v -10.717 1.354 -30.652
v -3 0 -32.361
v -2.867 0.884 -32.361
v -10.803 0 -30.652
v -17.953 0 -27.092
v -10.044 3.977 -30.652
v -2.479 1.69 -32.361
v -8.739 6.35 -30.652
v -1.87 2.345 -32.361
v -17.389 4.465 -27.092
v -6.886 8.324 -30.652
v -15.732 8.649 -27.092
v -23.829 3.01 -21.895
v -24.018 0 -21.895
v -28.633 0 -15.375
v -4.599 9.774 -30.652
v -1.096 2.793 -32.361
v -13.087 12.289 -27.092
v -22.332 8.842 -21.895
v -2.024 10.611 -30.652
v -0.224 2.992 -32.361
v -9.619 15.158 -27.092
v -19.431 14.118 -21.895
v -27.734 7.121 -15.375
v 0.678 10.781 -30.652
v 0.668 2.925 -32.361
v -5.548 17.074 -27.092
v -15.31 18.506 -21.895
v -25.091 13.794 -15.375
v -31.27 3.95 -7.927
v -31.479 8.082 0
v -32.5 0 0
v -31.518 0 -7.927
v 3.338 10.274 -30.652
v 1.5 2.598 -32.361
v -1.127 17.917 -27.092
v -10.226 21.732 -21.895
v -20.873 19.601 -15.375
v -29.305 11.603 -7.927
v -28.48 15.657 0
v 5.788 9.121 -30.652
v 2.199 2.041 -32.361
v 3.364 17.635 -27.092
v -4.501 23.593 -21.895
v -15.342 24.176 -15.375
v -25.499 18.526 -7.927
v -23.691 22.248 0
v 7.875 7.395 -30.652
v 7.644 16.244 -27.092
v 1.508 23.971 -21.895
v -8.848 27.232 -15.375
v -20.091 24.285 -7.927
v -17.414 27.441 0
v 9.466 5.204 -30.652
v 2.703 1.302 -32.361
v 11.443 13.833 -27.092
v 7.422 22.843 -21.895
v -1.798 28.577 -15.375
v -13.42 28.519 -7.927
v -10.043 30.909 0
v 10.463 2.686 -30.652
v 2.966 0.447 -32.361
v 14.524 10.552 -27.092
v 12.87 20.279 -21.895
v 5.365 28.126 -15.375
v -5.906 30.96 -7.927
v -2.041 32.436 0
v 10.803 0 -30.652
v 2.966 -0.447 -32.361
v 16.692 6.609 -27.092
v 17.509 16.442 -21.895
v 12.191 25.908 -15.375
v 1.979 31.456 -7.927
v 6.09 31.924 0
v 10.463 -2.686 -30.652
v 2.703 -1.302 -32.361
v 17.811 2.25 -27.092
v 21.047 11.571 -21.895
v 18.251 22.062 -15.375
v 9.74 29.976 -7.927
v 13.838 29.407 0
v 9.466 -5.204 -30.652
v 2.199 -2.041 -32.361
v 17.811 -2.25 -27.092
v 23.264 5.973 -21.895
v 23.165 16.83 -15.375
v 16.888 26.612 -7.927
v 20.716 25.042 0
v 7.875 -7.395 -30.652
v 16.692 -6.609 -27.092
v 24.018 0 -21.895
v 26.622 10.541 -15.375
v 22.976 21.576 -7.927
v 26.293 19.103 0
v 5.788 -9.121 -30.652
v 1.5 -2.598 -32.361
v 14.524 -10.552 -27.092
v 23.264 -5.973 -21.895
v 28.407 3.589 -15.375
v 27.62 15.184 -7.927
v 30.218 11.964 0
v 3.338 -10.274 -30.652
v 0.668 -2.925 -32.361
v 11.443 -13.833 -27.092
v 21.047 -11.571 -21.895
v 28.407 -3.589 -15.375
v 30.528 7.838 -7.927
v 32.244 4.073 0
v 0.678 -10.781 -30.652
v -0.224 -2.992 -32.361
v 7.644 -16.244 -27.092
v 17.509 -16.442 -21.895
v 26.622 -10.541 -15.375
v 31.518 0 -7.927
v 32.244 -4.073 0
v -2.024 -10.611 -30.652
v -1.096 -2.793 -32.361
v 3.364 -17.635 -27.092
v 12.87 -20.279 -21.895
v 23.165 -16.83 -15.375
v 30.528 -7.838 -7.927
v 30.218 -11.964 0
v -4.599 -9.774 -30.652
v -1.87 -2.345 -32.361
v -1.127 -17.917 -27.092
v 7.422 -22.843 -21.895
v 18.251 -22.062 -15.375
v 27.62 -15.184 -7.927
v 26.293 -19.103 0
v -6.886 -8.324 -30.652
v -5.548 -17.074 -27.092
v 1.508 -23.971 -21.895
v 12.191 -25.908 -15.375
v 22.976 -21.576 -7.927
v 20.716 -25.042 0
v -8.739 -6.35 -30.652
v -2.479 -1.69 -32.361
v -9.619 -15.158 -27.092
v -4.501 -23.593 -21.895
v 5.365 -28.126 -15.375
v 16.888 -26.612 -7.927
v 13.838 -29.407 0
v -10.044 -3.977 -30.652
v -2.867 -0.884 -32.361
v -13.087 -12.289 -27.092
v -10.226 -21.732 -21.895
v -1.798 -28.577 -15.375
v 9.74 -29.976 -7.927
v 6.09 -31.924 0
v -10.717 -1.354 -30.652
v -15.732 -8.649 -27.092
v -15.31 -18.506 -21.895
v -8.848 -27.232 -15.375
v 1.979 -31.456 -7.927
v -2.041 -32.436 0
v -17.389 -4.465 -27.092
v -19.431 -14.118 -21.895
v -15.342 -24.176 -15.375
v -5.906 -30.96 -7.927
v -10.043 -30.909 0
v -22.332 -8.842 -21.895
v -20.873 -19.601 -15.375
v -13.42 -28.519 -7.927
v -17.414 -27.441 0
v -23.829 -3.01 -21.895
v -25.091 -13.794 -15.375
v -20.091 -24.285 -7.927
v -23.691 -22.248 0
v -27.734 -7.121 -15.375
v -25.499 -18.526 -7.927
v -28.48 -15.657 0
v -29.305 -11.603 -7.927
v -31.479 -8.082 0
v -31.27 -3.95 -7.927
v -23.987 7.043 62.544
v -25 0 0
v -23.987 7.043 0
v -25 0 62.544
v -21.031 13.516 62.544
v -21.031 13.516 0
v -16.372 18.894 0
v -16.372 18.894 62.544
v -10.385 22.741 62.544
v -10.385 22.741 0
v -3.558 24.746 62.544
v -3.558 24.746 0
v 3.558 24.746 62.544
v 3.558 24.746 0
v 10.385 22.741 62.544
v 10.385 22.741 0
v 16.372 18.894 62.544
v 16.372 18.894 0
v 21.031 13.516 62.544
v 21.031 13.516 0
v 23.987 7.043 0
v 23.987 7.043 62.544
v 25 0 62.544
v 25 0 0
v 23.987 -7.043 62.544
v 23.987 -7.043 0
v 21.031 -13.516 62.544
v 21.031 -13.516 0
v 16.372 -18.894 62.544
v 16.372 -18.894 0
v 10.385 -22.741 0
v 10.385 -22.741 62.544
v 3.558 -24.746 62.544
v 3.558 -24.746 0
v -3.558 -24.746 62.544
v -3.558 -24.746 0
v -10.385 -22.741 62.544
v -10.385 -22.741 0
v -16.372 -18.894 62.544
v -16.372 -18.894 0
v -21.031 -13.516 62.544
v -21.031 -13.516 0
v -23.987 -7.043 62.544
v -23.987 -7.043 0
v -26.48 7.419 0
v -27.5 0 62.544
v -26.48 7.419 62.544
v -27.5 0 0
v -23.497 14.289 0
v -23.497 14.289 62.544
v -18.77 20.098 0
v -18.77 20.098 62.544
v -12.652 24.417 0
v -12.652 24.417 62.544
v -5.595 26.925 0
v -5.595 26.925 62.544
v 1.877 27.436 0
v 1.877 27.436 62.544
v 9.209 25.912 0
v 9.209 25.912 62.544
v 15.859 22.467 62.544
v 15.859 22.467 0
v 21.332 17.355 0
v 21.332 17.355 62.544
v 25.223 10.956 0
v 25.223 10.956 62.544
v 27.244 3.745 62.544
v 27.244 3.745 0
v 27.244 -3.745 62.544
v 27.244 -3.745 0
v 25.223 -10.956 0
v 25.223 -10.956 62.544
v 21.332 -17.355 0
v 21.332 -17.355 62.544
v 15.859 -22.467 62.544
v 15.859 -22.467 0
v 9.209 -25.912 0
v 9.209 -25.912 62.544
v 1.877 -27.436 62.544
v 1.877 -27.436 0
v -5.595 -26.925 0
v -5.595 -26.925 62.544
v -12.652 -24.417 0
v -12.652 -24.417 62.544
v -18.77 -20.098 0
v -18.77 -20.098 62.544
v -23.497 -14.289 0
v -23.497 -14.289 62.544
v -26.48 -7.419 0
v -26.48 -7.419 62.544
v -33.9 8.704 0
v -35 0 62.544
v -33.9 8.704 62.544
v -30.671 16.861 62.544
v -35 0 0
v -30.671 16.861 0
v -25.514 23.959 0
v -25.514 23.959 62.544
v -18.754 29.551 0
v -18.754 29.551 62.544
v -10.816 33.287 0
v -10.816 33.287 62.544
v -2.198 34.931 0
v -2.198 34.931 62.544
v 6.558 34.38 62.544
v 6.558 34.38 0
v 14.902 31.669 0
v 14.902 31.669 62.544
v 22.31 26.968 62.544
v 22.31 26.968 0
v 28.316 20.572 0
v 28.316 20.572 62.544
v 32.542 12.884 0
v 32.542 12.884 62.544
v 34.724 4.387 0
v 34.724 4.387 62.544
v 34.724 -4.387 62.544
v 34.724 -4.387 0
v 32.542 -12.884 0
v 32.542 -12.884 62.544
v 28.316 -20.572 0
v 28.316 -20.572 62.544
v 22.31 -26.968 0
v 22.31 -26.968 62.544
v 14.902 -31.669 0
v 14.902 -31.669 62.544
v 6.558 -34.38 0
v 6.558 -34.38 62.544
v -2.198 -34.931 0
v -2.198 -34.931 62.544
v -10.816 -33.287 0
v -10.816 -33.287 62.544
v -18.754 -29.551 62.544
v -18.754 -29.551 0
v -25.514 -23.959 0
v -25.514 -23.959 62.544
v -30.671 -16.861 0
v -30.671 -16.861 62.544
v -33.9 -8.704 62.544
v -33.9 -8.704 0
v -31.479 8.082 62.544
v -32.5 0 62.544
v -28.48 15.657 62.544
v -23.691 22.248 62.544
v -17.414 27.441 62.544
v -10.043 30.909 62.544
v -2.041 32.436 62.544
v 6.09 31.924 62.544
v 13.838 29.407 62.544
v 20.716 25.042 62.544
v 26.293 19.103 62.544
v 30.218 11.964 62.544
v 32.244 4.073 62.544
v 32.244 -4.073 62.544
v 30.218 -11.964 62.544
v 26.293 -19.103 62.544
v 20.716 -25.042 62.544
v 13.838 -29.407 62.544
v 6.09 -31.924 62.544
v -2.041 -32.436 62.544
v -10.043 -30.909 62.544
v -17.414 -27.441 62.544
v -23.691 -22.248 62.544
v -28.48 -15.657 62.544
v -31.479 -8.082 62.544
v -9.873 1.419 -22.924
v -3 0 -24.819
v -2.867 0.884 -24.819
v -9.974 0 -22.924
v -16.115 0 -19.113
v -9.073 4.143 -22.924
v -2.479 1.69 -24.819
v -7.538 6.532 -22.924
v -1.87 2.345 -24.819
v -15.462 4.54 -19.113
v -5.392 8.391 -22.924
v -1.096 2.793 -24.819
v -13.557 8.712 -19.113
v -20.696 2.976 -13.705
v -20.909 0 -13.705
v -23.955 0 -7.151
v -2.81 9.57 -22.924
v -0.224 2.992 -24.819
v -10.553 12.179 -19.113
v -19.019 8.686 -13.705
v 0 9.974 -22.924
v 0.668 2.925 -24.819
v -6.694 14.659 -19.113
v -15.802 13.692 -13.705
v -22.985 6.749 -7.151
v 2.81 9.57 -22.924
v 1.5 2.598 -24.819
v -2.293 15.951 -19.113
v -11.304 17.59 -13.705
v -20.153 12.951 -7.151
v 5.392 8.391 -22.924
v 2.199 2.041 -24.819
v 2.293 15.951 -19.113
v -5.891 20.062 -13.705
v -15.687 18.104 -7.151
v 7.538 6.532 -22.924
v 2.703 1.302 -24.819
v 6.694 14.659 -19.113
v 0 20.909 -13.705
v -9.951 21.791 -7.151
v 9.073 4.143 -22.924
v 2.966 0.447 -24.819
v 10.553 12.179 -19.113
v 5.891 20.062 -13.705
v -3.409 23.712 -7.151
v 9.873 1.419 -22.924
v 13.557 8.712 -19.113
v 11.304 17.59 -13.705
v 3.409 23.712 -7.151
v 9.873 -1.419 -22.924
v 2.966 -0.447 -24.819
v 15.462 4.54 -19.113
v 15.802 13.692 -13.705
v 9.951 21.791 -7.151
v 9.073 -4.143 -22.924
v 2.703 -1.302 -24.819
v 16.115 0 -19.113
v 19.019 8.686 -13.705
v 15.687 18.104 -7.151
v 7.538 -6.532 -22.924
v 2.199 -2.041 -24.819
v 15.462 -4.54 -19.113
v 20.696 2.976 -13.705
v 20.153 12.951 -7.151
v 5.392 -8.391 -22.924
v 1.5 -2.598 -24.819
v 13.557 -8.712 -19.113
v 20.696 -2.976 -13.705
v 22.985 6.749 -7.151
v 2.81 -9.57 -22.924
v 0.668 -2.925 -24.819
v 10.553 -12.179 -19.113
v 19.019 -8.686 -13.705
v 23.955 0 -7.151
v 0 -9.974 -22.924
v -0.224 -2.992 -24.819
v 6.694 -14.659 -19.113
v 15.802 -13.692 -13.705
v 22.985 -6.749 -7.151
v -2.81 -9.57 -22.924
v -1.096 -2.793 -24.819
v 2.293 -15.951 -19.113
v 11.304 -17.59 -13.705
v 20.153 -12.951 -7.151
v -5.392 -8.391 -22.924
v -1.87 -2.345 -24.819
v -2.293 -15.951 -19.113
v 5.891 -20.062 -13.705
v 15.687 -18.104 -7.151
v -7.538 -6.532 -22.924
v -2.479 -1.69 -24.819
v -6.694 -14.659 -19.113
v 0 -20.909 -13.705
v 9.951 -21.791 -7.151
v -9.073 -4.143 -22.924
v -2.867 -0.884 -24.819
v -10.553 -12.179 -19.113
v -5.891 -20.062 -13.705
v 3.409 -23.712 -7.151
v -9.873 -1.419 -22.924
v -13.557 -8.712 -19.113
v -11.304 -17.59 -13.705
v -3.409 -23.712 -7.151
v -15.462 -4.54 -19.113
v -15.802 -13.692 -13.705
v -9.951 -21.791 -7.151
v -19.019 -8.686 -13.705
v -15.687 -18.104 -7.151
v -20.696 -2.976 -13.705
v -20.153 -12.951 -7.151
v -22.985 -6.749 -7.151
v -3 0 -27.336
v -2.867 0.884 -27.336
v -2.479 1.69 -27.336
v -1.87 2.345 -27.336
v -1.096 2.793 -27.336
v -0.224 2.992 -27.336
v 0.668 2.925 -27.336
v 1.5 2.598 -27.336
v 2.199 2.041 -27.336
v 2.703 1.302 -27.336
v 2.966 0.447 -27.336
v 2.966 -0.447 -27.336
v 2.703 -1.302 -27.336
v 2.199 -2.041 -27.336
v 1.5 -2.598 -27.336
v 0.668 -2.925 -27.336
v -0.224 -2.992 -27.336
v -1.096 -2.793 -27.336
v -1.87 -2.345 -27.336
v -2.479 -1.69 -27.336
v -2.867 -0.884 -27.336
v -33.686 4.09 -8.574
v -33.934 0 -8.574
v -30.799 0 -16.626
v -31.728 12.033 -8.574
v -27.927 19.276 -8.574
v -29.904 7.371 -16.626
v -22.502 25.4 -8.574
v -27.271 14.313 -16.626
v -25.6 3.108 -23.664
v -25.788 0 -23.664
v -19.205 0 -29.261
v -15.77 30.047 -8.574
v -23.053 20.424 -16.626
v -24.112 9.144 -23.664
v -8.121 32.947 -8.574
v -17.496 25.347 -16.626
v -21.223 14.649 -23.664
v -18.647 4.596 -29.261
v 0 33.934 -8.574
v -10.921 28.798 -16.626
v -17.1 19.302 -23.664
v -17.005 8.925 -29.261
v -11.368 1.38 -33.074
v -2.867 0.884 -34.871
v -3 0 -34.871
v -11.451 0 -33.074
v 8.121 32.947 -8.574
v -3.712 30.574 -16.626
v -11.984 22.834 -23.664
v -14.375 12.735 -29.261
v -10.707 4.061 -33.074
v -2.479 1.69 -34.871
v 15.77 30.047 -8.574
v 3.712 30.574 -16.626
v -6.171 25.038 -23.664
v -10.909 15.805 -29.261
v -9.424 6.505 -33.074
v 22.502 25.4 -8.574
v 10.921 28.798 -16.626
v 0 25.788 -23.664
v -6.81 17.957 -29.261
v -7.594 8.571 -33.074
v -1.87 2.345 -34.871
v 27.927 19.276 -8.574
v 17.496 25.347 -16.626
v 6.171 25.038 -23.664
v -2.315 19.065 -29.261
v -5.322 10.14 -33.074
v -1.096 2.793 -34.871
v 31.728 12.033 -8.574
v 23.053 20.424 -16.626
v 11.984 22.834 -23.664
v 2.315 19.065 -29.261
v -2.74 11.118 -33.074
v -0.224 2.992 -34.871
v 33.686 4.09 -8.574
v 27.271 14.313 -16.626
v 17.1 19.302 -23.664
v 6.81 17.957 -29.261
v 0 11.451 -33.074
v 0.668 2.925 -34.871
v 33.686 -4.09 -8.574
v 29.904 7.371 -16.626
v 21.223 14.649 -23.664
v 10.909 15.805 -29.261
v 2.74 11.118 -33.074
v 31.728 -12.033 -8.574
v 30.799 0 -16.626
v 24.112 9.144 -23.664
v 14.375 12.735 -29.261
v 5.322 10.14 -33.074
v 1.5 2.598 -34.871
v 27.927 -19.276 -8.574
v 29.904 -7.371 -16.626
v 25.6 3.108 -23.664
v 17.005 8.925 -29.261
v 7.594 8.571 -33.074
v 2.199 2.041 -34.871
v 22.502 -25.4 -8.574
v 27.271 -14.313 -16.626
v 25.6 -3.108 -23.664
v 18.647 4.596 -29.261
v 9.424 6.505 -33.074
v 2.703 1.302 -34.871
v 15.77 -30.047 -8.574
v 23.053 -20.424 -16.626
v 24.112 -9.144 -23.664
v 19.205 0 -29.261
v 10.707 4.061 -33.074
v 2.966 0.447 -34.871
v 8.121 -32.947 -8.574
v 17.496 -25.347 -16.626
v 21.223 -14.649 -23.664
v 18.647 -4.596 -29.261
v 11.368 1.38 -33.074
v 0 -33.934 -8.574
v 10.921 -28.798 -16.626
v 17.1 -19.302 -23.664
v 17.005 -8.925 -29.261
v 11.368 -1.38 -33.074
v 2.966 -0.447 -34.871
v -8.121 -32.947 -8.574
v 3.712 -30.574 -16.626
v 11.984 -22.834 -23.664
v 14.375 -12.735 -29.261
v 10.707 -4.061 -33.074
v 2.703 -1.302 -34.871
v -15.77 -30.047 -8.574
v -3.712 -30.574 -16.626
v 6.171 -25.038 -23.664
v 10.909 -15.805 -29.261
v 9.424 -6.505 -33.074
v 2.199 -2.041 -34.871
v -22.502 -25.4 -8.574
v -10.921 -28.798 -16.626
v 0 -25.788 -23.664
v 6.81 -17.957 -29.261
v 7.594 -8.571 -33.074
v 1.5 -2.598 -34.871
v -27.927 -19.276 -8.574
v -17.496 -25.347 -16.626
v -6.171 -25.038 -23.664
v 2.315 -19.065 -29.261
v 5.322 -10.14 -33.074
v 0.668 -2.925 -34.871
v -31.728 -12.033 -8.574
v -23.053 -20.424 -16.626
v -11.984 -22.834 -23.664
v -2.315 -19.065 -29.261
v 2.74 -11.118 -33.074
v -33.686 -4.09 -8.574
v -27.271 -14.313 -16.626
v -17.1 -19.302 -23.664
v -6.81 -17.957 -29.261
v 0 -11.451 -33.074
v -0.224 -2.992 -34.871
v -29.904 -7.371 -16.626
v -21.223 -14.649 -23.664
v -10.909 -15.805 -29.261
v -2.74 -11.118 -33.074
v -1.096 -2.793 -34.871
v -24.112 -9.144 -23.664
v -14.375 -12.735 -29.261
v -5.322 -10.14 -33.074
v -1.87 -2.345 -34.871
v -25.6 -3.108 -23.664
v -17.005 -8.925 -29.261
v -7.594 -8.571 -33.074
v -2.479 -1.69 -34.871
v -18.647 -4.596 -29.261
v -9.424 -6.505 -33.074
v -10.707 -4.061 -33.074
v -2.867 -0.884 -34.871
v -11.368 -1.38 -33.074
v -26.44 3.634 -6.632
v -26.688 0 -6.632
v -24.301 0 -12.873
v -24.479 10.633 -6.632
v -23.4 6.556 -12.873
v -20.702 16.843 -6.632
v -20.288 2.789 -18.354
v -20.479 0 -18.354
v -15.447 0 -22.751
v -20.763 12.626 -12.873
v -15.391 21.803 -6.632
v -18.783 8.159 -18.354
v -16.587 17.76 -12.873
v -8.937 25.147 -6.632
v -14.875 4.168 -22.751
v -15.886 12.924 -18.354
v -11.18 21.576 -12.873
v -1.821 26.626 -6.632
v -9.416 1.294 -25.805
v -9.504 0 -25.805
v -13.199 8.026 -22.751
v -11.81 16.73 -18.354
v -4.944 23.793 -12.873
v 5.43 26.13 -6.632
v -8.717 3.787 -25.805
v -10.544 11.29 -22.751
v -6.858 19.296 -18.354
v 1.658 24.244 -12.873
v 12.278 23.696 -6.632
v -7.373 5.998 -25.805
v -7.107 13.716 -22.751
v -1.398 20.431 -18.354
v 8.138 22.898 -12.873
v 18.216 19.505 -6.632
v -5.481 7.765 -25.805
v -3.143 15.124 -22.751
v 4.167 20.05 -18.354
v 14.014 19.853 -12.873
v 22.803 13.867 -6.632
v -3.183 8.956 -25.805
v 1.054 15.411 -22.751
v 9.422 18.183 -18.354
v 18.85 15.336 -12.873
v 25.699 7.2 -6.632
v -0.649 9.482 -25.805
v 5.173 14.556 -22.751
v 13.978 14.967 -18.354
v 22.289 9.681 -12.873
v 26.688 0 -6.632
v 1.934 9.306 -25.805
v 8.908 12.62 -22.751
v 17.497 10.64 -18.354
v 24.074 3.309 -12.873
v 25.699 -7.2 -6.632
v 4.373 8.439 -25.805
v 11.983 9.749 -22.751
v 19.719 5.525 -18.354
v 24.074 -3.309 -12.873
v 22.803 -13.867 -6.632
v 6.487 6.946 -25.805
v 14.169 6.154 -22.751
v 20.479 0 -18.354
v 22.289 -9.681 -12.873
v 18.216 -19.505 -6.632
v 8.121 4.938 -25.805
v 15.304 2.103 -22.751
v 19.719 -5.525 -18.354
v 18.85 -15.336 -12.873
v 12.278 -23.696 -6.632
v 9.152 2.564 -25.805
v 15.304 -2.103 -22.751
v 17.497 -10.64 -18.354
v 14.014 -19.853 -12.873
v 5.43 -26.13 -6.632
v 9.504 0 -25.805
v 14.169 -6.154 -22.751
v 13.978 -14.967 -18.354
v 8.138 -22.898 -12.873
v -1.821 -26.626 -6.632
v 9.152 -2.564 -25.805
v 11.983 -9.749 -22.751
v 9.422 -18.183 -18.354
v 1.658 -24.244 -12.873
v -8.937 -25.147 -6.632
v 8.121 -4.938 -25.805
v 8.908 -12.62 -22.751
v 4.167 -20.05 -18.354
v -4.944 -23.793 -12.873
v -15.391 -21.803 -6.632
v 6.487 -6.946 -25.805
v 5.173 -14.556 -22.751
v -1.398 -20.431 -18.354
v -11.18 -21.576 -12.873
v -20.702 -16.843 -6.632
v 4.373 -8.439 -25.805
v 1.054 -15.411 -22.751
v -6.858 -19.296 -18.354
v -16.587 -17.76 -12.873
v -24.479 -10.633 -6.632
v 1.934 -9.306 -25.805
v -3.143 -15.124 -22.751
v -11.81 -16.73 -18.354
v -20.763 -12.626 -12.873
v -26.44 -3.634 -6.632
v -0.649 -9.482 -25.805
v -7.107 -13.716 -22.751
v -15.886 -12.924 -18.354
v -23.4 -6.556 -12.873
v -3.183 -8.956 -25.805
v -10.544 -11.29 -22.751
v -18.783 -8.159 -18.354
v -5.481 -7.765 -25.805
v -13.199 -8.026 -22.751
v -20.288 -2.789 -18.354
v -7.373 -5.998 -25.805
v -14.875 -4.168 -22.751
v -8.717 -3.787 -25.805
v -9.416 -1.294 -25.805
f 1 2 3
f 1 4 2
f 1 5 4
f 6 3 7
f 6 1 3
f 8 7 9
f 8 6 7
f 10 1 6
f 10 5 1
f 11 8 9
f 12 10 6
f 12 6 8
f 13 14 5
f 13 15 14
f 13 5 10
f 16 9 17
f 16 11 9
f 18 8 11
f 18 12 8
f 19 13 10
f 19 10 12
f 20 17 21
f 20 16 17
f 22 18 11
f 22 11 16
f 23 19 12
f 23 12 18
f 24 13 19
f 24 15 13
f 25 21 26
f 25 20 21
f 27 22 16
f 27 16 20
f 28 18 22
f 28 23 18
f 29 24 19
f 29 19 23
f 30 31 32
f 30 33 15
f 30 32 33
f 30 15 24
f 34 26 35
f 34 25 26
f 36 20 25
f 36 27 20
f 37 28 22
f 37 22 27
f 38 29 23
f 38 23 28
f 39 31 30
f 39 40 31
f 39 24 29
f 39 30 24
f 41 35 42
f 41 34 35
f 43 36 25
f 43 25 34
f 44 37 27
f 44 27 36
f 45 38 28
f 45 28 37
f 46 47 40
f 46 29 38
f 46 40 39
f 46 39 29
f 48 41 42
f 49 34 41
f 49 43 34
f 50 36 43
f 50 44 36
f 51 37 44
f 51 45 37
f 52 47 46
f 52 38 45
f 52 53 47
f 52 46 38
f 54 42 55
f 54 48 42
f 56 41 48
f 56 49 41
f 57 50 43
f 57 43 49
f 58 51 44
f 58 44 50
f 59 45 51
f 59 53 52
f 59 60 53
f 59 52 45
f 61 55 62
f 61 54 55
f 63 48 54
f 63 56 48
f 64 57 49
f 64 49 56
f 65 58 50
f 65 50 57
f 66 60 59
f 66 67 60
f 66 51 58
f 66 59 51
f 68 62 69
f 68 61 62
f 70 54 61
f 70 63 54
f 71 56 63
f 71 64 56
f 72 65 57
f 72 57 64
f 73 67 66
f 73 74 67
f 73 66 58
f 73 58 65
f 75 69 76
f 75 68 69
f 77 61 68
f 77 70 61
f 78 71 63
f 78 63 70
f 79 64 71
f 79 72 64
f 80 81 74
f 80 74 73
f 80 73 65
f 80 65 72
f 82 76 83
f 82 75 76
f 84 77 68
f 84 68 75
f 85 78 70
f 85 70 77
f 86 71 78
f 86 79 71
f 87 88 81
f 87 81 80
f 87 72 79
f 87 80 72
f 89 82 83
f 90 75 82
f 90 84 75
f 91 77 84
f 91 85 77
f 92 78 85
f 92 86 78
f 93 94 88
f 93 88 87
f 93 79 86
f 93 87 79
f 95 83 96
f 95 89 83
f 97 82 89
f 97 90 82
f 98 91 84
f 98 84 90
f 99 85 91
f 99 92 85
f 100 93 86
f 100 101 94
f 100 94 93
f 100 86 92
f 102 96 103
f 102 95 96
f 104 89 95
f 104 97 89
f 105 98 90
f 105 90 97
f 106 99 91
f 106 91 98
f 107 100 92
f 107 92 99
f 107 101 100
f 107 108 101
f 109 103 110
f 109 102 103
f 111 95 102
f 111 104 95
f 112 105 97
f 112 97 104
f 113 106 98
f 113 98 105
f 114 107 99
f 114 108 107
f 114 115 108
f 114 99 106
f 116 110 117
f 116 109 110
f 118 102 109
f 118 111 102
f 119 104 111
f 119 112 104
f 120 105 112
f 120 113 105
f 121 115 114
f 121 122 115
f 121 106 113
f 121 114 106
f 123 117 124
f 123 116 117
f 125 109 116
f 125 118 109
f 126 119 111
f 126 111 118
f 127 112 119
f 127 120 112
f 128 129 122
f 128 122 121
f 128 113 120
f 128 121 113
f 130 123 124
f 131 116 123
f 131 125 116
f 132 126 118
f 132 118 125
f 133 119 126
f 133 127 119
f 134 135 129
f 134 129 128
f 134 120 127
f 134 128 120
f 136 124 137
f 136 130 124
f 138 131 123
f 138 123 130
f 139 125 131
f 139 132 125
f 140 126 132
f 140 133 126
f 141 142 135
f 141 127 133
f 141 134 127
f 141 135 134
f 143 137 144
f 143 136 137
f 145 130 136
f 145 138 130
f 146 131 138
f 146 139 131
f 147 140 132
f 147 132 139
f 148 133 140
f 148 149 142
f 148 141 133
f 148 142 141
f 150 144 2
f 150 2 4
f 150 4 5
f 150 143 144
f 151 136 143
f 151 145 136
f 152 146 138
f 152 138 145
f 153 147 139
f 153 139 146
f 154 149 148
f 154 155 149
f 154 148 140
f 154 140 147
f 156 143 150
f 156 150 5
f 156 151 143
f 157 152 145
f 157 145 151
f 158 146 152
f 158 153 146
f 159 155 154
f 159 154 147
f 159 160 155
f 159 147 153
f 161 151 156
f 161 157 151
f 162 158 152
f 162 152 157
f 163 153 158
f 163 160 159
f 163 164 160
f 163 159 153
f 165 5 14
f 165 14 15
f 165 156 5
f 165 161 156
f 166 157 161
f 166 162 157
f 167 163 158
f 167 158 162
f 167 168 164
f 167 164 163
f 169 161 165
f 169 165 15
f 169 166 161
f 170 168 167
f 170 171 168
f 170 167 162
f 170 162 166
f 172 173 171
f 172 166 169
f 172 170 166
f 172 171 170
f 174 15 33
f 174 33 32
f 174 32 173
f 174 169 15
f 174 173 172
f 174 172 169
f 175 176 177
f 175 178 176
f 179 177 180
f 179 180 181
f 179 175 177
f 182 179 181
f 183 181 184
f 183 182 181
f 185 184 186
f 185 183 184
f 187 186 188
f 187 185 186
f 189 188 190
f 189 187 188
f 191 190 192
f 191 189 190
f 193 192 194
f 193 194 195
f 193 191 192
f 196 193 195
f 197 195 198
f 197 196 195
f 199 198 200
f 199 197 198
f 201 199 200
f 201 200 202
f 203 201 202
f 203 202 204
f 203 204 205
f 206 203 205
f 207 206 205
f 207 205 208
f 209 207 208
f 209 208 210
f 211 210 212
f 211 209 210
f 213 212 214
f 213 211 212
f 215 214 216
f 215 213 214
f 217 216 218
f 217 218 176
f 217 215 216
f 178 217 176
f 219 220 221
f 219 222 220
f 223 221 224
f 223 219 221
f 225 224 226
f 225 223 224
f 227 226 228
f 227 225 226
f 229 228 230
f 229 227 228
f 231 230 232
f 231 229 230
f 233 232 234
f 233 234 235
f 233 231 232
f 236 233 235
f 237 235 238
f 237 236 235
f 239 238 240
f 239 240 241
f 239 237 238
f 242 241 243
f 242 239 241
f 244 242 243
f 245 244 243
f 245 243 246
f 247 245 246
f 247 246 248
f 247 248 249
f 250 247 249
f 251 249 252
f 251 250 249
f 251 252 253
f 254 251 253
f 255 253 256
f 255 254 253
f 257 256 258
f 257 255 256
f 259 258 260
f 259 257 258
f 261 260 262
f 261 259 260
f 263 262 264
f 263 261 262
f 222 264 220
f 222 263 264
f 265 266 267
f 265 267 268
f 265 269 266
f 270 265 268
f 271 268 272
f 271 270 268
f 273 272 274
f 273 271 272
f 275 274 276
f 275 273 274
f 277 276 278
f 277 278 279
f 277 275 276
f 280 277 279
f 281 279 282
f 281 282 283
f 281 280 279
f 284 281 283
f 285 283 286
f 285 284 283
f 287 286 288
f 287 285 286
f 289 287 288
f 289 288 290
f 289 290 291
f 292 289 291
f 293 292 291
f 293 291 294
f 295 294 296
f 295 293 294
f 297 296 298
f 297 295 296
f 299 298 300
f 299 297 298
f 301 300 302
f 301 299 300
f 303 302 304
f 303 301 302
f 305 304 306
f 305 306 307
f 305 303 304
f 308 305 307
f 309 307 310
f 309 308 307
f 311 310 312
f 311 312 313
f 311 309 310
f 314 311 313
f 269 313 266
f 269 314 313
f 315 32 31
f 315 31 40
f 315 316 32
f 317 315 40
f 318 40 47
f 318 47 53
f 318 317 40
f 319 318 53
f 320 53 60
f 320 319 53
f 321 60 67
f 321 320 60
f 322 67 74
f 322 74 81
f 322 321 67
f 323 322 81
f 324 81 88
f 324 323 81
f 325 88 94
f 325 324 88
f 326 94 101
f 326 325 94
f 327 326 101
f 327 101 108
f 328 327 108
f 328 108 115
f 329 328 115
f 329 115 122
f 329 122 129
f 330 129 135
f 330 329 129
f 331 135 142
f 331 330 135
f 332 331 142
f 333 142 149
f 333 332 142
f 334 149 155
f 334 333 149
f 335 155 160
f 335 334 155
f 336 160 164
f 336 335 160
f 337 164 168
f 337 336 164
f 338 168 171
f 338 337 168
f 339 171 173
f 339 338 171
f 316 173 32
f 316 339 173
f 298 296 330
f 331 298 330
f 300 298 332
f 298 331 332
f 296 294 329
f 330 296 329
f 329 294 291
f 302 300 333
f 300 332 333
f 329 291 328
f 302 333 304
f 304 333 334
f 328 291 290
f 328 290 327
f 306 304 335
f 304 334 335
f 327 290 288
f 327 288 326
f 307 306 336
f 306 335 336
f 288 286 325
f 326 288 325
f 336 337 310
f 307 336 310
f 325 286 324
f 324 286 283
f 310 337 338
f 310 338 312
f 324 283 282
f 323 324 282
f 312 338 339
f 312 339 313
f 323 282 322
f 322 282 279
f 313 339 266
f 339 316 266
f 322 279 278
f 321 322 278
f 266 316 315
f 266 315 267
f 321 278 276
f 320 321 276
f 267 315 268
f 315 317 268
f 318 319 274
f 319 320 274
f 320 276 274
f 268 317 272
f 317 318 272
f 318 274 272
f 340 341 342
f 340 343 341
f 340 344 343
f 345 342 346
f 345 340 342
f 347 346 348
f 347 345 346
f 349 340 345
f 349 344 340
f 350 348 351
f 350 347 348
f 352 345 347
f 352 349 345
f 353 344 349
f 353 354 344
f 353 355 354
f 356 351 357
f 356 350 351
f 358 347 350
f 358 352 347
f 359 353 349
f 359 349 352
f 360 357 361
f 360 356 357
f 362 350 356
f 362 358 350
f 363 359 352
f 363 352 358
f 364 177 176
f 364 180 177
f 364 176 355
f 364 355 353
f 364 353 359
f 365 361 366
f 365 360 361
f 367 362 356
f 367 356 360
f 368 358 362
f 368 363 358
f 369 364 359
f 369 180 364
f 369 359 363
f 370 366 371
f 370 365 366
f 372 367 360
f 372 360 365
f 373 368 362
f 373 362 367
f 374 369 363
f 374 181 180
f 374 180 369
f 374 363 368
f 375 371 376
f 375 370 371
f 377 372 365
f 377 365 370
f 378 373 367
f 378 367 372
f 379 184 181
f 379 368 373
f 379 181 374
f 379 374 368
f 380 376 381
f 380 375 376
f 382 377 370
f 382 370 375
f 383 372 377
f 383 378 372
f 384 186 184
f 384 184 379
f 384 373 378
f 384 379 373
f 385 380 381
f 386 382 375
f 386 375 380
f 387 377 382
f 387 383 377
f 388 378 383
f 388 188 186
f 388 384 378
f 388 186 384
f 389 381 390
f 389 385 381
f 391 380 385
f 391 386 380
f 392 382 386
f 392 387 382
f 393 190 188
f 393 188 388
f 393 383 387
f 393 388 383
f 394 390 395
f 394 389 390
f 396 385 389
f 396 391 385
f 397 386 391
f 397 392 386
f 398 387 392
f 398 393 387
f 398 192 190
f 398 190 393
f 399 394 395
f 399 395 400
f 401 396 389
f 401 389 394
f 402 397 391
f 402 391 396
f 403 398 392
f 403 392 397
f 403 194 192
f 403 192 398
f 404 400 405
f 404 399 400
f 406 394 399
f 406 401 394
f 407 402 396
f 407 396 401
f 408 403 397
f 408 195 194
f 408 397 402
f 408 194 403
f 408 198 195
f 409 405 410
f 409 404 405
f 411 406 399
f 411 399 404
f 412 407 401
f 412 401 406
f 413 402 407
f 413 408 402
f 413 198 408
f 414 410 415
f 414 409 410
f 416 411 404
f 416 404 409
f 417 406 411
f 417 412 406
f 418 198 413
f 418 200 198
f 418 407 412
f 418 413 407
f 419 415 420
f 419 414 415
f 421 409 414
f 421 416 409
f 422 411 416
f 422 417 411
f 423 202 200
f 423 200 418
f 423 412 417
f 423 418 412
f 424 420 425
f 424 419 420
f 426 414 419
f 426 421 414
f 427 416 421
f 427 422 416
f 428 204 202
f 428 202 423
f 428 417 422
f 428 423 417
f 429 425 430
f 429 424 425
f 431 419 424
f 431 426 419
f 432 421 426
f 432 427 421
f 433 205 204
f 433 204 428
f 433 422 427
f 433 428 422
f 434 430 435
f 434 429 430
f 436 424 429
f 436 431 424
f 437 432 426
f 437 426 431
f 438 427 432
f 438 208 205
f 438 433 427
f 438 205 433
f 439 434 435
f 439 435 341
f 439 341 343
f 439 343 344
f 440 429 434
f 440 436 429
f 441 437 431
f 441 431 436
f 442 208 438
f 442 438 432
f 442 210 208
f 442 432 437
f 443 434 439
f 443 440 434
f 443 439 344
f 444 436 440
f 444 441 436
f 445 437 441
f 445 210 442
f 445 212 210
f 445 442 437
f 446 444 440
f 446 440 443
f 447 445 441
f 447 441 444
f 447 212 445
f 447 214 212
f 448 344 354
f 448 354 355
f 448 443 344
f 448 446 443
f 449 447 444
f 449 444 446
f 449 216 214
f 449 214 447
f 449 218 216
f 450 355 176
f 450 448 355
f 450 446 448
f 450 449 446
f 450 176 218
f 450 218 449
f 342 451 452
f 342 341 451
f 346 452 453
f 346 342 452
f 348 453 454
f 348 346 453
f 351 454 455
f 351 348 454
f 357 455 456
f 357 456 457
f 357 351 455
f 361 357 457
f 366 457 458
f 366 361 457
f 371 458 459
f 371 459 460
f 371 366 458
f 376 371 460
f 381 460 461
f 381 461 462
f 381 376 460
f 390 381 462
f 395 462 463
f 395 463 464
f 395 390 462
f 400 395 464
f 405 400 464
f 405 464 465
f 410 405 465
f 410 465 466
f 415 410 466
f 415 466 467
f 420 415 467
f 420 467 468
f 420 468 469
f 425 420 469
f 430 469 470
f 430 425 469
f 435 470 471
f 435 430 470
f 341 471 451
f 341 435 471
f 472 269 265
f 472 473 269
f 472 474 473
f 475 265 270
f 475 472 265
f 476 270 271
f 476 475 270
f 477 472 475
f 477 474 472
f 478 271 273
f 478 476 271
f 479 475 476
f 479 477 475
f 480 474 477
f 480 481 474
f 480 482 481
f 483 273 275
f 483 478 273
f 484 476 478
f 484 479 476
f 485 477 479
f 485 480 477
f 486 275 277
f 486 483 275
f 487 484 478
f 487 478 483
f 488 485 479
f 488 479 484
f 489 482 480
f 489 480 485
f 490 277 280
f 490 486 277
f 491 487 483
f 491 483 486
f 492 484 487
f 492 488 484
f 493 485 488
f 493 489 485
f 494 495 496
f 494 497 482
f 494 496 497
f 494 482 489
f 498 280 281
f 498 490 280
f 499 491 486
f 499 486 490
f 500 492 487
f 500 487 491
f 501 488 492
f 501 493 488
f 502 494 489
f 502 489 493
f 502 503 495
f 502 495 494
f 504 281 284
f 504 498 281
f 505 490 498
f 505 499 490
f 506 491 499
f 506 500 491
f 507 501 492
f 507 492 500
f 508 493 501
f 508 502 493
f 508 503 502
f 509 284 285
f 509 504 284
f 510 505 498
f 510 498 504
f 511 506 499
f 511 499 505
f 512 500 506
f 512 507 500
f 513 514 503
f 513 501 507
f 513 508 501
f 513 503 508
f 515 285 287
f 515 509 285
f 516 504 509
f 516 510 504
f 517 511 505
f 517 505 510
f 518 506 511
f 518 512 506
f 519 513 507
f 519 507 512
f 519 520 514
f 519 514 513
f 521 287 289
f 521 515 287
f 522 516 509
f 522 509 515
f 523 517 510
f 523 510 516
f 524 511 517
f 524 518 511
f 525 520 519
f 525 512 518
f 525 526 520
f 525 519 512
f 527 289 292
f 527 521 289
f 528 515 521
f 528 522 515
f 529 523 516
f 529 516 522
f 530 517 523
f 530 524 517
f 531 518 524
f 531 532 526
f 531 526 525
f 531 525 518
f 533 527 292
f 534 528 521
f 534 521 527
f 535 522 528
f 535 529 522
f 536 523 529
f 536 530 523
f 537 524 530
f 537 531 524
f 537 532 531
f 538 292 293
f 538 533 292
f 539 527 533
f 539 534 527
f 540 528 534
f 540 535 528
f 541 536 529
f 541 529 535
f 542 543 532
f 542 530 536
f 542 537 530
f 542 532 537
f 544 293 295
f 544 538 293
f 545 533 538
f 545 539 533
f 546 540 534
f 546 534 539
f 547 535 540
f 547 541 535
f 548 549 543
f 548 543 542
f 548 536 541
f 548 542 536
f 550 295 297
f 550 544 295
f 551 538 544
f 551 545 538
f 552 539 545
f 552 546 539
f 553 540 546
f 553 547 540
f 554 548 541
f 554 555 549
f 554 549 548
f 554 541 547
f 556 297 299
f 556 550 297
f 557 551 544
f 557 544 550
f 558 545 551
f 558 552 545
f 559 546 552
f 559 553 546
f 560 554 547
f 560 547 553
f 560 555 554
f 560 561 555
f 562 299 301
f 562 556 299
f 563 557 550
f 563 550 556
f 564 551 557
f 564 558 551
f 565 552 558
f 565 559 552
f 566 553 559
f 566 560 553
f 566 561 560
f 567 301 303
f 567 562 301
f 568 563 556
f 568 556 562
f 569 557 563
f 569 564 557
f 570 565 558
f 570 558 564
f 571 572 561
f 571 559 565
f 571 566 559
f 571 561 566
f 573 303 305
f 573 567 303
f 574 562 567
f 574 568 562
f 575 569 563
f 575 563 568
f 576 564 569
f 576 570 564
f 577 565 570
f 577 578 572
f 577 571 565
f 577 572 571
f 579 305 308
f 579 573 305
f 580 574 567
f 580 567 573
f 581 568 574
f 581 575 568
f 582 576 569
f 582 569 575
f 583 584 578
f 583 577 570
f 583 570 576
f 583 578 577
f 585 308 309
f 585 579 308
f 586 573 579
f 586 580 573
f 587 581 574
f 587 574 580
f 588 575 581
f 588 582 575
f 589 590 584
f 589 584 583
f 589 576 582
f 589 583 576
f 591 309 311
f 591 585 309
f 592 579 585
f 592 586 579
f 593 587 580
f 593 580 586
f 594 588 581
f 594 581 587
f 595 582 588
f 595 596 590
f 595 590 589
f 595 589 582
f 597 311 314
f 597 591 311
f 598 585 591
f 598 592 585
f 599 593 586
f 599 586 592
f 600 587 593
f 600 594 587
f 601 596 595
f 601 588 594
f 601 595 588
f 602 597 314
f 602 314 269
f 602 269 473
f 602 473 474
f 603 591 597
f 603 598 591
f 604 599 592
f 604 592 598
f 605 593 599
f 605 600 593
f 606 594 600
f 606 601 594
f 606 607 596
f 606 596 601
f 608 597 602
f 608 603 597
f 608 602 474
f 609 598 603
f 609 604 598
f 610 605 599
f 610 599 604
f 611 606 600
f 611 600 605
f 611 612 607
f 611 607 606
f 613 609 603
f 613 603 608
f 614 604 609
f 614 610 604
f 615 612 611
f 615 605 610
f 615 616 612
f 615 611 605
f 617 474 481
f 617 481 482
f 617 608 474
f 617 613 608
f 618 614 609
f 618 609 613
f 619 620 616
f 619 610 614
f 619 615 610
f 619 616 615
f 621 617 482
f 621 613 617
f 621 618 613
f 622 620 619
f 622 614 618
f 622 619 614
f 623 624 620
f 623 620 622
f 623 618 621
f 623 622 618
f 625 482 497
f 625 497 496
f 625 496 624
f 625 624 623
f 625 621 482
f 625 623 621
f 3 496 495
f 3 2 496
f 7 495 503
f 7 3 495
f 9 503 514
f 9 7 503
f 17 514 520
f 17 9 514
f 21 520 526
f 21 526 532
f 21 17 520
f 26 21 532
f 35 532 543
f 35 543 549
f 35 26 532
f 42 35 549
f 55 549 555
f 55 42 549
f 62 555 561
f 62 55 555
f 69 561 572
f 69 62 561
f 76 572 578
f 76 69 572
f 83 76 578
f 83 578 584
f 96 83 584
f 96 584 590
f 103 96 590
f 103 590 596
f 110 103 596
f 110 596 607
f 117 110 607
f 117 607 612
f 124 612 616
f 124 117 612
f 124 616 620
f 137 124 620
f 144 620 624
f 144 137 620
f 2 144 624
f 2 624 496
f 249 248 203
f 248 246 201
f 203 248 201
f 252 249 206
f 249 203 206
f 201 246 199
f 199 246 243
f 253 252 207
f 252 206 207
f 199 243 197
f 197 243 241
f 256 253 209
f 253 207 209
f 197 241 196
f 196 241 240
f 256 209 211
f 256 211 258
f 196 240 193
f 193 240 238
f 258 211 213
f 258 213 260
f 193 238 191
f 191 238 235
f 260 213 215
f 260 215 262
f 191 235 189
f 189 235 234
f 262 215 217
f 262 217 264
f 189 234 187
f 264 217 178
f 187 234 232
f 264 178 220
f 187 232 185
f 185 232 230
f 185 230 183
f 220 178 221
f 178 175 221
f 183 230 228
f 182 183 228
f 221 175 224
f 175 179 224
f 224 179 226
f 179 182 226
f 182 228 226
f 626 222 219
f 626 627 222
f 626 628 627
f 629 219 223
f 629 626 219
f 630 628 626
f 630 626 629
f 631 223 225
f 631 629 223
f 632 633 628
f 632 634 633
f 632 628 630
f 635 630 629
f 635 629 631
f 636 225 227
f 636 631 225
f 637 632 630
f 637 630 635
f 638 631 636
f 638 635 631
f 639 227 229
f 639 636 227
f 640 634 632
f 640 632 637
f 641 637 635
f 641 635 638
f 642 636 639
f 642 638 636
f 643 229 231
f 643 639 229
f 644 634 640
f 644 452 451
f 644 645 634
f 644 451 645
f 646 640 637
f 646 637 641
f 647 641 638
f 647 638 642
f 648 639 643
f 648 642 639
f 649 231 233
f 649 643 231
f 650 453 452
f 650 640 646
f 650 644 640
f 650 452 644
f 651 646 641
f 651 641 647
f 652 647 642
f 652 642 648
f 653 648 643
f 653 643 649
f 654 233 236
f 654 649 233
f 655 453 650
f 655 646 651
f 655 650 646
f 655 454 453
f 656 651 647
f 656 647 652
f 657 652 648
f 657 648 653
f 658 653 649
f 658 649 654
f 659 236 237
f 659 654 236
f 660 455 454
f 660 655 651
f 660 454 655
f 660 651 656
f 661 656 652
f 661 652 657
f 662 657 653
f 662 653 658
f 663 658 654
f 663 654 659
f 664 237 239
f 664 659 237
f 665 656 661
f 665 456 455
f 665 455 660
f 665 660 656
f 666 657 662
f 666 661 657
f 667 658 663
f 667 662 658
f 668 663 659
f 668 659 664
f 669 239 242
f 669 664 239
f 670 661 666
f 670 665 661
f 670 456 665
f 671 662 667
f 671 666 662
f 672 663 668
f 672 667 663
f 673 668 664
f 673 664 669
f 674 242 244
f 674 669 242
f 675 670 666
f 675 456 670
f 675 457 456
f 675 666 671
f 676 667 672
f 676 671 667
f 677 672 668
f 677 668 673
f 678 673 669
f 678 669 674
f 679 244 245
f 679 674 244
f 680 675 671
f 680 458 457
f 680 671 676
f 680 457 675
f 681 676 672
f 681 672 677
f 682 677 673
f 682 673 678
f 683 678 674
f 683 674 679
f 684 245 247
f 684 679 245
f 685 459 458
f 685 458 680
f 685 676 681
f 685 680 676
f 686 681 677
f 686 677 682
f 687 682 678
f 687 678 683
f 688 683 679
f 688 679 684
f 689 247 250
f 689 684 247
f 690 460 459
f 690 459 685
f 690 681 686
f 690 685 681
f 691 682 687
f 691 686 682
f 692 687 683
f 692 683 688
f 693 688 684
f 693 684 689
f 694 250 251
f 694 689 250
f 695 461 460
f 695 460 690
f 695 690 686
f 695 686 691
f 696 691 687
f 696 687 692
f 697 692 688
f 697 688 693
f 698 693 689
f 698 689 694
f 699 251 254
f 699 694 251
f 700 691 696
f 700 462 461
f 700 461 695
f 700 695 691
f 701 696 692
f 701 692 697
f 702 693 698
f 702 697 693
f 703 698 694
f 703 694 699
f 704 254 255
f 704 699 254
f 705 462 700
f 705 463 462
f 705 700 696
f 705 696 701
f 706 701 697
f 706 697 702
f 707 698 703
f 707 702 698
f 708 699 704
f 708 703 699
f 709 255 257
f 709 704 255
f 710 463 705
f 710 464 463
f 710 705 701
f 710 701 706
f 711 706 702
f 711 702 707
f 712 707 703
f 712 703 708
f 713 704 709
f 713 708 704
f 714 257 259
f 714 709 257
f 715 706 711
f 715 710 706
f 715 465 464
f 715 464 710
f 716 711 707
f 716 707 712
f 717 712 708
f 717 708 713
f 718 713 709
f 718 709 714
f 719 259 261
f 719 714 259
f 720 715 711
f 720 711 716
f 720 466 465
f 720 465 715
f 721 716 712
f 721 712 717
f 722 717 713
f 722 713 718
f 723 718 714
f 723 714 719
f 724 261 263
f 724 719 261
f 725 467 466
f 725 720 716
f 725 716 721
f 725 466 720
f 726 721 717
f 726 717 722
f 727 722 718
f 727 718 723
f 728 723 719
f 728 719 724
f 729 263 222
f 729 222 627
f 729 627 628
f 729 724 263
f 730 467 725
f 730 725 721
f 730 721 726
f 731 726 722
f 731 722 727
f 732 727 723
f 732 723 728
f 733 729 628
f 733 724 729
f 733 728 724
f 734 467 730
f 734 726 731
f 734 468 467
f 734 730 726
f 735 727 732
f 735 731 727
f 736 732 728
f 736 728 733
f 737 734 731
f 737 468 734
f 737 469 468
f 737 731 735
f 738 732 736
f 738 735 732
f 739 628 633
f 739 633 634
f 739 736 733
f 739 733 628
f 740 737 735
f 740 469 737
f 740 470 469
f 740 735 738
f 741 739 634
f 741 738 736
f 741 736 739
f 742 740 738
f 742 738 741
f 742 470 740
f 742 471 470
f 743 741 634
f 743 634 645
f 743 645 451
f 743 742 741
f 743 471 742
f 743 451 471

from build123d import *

# Parameters (mm, degrees)
F0_W = 2.5
F0_H = 5


with BuildPart() as f1:
    # F0 (on Front) → F1 (revolve)
    with BuildSketch(Plane.XZ):
        with Locations((-26.25, 60.0437200069)):
            Rectangle(F0_W, F0_H)
        with BuildLine():
            ThreePointArc((-3.0000000261, -24.8193472888), (-18.7082869426, -16.5831239419), (-25, 0))
            Line((-25, 0), (-25, 57.5437200069))
            Line((-25, 57.5437200069), (-27.5, 57.5437200069))
            Line((-27.5, 57.5437200069), (-27.5, 0))
            ThreePointArc((-27.5, 0), (-20.478647425, -18.3541548332), (-3.0000000261, -27.3358738628))
            Line((-3.0000000261, -27.3358738628), (-3.0000000261, -24.8193472888))
        make_face()
    revolve(axis=Axis((0, 0, 9.7777000327), (0, 0, -1)))


with BuildPart() as f1b:
    # F0 (on Front) → F1, piece 2 (revolve)
    with BuildSketch(Plane.XZ):
        with Locations((-33.75, 60.0437200069)):
            Rectangle(F0_W, F0_H)
        with BuildLine():
            Line((-3.0000000261, -34.8711915461), (-3.0000000261, -32.3612422482))
            ThreePointArc((-3.0000000261, -32.3612422482), (-24.0182222578, -21.8946340361), (-32.5, 0))
            Line((-32.5, 0), (-32.5, 57.5437200069))
            Line((-32.5, 57.5437200069), (-35, 57.5437200069))
            Line((-35, 57.5437200069), (-35, 0))
            ThreePointArc((-35, 0), (-25.7875939253, -23.6643191228), (-3.0000000261, -34.8711915461))
        make_face()
    revolve(axis=Axis((0, 0, 9.7777000327), (0, 0, -1)))


solid = Compound([f1.part, f1b.part])
